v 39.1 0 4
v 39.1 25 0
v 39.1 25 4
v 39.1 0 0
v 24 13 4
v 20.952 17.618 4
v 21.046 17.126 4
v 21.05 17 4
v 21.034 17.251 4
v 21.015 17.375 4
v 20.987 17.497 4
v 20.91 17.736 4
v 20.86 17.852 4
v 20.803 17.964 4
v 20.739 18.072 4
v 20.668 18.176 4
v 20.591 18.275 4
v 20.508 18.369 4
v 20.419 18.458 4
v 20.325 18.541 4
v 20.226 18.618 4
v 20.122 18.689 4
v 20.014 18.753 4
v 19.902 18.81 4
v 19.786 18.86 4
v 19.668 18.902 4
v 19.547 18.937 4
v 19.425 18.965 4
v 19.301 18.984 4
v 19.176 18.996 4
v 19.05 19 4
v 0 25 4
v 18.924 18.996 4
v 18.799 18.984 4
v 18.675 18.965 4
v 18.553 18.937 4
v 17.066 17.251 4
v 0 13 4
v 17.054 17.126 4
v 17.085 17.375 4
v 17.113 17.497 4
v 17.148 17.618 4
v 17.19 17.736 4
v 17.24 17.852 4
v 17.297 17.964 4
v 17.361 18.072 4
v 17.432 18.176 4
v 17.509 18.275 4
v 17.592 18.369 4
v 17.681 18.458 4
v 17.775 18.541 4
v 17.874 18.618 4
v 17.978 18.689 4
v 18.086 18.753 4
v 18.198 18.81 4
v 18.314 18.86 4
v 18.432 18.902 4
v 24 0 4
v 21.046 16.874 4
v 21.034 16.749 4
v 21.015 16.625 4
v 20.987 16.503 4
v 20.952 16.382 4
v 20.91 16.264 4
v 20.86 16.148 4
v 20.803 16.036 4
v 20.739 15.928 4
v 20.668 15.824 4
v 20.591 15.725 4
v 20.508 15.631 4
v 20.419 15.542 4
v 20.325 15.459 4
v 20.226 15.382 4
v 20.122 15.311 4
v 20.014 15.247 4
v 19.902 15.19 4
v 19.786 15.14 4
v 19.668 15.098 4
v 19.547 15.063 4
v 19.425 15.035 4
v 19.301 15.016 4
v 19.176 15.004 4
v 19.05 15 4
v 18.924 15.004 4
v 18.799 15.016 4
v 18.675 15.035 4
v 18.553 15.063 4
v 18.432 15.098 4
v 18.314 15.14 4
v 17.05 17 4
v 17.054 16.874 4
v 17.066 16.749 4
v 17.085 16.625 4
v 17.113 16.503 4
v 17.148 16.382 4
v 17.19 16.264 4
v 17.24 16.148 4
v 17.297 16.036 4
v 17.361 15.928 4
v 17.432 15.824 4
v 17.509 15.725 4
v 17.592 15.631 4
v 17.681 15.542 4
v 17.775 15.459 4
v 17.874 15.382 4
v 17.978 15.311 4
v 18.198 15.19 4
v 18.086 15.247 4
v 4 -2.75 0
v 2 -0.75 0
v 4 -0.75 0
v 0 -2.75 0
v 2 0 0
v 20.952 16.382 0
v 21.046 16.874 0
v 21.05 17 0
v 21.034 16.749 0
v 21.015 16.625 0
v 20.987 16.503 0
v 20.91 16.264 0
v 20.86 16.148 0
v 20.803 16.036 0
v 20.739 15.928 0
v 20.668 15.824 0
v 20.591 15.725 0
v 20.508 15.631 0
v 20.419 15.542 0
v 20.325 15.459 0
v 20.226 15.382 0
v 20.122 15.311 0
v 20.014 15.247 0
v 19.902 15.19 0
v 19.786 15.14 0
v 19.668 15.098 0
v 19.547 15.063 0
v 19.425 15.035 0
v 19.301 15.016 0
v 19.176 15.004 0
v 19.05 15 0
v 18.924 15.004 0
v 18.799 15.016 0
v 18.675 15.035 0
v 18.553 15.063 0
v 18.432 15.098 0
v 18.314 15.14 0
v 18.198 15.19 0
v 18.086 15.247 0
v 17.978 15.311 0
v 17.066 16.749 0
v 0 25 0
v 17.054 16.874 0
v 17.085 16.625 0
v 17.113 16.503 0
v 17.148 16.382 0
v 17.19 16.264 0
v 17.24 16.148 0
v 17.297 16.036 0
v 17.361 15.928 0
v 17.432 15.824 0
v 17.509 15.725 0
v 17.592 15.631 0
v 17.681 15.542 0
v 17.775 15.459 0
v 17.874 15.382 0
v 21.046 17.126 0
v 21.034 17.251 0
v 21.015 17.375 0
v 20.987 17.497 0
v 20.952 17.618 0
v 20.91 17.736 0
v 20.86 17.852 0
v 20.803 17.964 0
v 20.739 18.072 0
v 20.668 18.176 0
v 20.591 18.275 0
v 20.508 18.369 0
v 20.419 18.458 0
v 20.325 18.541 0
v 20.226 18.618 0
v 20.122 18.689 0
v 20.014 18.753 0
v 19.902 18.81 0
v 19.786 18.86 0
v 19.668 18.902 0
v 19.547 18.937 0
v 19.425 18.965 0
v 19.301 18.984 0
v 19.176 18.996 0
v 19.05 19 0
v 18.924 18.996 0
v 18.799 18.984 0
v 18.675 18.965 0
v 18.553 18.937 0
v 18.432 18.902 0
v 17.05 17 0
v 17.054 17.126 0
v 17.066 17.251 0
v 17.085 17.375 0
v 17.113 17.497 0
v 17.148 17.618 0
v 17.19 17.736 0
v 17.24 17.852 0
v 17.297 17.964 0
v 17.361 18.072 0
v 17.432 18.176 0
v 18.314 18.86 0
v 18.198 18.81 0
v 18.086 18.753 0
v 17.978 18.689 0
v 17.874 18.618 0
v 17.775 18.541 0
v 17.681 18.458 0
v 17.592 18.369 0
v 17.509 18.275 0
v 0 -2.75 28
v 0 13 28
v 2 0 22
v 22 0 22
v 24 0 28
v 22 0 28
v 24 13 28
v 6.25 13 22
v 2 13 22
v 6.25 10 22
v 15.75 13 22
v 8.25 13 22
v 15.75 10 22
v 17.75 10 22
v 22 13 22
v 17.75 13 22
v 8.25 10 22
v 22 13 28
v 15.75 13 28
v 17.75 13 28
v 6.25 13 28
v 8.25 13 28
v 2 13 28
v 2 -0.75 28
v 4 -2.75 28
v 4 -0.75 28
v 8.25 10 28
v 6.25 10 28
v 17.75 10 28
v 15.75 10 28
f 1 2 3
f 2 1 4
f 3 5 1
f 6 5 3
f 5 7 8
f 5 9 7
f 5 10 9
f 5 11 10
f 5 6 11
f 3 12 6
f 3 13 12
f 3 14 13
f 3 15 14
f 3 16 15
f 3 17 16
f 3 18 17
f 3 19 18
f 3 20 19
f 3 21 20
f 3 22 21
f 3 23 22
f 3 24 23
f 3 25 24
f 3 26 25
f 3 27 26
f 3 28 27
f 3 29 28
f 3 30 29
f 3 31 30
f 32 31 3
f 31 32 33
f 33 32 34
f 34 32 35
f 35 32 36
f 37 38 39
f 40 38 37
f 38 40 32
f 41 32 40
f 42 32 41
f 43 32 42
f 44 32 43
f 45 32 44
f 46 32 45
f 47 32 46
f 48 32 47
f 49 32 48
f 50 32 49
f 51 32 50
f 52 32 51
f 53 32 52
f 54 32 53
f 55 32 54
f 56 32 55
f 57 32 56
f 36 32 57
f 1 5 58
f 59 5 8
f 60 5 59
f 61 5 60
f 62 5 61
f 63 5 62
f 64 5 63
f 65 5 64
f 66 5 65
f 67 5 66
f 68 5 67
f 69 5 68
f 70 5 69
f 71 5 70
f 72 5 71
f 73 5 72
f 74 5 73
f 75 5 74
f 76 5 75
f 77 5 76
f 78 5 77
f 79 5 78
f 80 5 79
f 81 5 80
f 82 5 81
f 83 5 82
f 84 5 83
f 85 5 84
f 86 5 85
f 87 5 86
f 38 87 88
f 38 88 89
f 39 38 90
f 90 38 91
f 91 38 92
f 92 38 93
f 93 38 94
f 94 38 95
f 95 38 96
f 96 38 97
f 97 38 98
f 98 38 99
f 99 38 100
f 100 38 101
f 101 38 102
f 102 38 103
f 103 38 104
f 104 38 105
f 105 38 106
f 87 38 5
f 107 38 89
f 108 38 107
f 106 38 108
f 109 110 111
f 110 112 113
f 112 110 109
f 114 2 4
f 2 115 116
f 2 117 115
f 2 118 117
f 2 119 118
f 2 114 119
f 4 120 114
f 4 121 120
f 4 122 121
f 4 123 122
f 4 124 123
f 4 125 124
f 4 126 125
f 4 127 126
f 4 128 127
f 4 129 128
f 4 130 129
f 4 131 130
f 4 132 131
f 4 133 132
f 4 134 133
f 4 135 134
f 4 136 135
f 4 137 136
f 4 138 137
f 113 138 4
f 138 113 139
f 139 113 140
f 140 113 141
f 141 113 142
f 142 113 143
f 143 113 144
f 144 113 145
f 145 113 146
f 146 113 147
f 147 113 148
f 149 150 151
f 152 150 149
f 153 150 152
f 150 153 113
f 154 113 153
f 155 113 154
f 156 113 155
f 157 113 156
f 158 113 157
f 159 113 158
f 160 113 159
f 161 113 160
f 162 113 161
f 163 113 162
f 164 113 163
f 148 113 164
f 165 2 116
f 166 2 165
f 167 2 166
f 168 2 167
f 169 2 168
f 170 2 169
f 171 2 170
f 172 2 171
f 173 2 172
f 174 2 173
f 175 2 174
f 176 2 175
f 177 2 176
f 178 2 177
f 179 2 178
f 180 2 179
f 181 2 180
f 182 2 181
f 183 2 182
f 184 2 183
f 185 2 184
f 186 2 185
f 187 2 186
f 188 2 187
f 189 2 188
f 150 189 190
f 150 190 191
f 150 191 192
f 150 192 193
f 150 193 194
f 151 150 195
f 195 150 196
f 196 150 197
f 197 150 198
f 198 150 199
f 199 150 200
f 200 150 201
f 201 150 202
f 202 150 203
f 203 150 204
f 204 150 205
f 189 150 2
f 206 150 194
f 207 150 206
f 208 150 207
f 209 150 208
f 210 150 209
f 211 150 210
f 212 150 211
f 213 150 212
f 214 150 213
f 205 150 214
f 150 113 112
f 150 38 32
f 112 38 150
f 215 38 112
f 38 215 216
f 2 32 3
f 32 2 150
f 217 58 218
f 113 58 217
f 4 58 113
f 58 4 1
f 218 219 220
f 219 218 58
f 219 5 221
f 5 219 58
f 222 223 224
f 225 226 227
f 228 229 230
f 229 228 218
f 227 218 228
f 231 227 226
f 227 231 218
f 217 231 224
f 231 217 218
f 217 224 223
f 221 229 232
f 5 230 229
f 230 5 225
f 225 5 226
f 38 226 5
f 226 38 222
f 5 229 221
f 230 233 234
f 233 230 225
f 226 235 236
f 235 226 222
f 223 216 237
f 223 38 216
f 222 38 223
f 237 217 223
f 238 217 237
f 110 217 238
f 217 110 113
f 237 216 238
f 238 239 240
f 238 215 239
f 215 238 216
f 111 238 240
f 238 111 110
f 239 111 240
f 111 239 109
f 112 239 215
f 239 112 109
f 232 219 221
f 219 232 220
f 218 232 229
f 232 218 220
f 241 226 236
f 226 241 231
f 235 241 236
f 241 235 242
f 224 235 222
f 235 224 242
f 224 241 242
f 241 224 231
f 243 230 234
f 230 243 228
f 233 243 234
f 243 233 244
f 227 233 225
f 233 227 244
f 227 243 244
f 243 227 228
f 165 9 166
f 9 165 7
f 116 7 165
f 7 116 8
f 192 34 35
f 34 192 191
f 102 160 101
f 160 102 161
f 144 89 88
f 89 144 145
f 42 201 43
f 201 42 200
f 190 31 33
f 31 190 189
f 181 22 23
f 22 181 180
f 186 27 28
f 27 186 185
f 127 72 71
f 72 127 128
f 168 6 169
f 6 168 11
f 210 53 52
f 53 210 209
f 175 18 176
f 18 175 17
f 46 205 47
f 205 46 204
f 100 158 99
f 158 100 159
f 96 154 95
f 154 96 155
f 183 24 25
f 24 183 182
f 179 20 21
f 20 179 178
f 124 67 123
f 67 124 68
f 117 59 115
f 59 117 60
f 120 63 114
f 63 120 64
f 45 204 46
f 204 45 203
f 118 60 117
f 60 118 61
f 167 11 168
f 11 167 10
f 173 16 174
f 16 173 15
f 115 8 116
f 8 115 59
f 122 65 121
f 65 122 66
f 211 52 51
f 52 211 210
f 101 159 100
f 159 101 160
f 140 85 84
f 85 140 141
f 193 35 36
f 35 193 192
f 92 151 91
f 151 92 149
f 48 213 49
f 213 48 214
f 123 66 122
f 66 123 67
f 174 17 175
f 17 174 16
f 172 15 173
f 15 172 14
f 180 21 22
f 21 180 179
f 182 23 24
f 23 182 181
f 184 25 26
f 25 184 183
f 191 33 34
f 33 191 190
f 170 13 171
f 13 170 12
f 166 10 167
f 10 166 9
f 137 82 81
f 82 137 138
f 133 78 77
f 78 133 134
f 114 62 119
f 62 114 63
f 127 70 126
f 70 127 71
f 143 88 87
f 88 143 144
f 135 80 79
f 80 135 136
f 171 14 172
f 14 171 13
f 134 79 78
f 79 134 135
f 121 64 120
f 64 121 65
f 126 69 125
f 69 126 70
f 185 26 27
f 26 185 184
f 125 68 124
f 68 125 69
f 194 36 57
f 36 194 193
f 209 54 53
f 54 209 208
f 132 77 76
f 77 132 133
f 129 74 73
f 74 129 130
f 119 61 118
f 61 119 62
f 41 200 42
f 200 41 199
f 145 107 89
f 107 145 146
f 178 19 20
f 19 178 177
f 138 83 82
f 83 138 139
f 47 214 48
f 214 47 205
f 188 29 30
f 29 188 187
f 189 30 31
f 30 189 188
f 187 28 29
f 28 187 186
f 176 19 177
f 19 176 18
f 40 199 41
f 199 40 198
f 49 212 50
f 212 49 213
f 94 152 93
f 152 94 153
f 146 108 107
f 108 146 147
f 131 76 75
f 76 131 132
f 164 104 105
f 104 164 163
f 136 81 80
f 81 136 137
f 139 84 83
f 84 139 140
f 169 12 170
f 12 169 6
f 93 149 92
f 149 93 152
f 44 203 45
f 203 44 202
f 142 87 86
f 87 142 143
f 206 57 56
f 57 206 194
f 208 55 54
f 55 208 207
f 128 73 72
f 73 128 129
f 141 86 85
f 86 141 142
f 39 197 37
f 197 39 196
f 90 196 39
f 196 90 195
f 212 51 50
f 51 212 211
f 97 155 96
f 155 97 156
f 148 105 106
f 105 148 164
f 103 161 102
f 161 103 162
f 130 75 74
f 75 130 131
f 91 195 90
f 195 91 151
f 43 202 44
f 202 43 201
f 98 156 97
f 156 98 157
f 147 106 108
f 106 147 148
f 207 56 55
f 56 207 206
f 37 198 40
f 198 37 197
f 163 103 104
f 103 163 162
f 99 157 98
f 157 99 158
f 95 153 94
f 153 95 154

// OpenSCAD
$fn=100;

base_z = 22;
top_z = 6;

difference() {
  union() {
    cube([39.1, 13+4+8, 4]);
    cube([24, 13, base_z]);
    translate([0, -.75, 0]) {
      cube([2, 13.75, base_z + top_z]);
    }
    translate([0, -2.75, 0]) {
      cube([4, 2, base_z + top_z]);
    }
    translate([22, 0, 0]) {
      cube([2, 13.0, base_z + top_z]);
    }
    translate([12-9.5/2 - 1, 10, 0]) {
      cube([2, 3, base_z + top_z]);
    }
    translate([12+9.5/2 - 1, 10, 0]) {
      cube([2, 3, base_z + top_z]);
    }
  }
  translate([19.05, 13+4, -1]) {
    cylinder(d=4, h=6);
  }
  /*
  translate([2, -0.1, 2]) {
    #cube([20, 13.2, base_z - 4]);
  }
  */
}
